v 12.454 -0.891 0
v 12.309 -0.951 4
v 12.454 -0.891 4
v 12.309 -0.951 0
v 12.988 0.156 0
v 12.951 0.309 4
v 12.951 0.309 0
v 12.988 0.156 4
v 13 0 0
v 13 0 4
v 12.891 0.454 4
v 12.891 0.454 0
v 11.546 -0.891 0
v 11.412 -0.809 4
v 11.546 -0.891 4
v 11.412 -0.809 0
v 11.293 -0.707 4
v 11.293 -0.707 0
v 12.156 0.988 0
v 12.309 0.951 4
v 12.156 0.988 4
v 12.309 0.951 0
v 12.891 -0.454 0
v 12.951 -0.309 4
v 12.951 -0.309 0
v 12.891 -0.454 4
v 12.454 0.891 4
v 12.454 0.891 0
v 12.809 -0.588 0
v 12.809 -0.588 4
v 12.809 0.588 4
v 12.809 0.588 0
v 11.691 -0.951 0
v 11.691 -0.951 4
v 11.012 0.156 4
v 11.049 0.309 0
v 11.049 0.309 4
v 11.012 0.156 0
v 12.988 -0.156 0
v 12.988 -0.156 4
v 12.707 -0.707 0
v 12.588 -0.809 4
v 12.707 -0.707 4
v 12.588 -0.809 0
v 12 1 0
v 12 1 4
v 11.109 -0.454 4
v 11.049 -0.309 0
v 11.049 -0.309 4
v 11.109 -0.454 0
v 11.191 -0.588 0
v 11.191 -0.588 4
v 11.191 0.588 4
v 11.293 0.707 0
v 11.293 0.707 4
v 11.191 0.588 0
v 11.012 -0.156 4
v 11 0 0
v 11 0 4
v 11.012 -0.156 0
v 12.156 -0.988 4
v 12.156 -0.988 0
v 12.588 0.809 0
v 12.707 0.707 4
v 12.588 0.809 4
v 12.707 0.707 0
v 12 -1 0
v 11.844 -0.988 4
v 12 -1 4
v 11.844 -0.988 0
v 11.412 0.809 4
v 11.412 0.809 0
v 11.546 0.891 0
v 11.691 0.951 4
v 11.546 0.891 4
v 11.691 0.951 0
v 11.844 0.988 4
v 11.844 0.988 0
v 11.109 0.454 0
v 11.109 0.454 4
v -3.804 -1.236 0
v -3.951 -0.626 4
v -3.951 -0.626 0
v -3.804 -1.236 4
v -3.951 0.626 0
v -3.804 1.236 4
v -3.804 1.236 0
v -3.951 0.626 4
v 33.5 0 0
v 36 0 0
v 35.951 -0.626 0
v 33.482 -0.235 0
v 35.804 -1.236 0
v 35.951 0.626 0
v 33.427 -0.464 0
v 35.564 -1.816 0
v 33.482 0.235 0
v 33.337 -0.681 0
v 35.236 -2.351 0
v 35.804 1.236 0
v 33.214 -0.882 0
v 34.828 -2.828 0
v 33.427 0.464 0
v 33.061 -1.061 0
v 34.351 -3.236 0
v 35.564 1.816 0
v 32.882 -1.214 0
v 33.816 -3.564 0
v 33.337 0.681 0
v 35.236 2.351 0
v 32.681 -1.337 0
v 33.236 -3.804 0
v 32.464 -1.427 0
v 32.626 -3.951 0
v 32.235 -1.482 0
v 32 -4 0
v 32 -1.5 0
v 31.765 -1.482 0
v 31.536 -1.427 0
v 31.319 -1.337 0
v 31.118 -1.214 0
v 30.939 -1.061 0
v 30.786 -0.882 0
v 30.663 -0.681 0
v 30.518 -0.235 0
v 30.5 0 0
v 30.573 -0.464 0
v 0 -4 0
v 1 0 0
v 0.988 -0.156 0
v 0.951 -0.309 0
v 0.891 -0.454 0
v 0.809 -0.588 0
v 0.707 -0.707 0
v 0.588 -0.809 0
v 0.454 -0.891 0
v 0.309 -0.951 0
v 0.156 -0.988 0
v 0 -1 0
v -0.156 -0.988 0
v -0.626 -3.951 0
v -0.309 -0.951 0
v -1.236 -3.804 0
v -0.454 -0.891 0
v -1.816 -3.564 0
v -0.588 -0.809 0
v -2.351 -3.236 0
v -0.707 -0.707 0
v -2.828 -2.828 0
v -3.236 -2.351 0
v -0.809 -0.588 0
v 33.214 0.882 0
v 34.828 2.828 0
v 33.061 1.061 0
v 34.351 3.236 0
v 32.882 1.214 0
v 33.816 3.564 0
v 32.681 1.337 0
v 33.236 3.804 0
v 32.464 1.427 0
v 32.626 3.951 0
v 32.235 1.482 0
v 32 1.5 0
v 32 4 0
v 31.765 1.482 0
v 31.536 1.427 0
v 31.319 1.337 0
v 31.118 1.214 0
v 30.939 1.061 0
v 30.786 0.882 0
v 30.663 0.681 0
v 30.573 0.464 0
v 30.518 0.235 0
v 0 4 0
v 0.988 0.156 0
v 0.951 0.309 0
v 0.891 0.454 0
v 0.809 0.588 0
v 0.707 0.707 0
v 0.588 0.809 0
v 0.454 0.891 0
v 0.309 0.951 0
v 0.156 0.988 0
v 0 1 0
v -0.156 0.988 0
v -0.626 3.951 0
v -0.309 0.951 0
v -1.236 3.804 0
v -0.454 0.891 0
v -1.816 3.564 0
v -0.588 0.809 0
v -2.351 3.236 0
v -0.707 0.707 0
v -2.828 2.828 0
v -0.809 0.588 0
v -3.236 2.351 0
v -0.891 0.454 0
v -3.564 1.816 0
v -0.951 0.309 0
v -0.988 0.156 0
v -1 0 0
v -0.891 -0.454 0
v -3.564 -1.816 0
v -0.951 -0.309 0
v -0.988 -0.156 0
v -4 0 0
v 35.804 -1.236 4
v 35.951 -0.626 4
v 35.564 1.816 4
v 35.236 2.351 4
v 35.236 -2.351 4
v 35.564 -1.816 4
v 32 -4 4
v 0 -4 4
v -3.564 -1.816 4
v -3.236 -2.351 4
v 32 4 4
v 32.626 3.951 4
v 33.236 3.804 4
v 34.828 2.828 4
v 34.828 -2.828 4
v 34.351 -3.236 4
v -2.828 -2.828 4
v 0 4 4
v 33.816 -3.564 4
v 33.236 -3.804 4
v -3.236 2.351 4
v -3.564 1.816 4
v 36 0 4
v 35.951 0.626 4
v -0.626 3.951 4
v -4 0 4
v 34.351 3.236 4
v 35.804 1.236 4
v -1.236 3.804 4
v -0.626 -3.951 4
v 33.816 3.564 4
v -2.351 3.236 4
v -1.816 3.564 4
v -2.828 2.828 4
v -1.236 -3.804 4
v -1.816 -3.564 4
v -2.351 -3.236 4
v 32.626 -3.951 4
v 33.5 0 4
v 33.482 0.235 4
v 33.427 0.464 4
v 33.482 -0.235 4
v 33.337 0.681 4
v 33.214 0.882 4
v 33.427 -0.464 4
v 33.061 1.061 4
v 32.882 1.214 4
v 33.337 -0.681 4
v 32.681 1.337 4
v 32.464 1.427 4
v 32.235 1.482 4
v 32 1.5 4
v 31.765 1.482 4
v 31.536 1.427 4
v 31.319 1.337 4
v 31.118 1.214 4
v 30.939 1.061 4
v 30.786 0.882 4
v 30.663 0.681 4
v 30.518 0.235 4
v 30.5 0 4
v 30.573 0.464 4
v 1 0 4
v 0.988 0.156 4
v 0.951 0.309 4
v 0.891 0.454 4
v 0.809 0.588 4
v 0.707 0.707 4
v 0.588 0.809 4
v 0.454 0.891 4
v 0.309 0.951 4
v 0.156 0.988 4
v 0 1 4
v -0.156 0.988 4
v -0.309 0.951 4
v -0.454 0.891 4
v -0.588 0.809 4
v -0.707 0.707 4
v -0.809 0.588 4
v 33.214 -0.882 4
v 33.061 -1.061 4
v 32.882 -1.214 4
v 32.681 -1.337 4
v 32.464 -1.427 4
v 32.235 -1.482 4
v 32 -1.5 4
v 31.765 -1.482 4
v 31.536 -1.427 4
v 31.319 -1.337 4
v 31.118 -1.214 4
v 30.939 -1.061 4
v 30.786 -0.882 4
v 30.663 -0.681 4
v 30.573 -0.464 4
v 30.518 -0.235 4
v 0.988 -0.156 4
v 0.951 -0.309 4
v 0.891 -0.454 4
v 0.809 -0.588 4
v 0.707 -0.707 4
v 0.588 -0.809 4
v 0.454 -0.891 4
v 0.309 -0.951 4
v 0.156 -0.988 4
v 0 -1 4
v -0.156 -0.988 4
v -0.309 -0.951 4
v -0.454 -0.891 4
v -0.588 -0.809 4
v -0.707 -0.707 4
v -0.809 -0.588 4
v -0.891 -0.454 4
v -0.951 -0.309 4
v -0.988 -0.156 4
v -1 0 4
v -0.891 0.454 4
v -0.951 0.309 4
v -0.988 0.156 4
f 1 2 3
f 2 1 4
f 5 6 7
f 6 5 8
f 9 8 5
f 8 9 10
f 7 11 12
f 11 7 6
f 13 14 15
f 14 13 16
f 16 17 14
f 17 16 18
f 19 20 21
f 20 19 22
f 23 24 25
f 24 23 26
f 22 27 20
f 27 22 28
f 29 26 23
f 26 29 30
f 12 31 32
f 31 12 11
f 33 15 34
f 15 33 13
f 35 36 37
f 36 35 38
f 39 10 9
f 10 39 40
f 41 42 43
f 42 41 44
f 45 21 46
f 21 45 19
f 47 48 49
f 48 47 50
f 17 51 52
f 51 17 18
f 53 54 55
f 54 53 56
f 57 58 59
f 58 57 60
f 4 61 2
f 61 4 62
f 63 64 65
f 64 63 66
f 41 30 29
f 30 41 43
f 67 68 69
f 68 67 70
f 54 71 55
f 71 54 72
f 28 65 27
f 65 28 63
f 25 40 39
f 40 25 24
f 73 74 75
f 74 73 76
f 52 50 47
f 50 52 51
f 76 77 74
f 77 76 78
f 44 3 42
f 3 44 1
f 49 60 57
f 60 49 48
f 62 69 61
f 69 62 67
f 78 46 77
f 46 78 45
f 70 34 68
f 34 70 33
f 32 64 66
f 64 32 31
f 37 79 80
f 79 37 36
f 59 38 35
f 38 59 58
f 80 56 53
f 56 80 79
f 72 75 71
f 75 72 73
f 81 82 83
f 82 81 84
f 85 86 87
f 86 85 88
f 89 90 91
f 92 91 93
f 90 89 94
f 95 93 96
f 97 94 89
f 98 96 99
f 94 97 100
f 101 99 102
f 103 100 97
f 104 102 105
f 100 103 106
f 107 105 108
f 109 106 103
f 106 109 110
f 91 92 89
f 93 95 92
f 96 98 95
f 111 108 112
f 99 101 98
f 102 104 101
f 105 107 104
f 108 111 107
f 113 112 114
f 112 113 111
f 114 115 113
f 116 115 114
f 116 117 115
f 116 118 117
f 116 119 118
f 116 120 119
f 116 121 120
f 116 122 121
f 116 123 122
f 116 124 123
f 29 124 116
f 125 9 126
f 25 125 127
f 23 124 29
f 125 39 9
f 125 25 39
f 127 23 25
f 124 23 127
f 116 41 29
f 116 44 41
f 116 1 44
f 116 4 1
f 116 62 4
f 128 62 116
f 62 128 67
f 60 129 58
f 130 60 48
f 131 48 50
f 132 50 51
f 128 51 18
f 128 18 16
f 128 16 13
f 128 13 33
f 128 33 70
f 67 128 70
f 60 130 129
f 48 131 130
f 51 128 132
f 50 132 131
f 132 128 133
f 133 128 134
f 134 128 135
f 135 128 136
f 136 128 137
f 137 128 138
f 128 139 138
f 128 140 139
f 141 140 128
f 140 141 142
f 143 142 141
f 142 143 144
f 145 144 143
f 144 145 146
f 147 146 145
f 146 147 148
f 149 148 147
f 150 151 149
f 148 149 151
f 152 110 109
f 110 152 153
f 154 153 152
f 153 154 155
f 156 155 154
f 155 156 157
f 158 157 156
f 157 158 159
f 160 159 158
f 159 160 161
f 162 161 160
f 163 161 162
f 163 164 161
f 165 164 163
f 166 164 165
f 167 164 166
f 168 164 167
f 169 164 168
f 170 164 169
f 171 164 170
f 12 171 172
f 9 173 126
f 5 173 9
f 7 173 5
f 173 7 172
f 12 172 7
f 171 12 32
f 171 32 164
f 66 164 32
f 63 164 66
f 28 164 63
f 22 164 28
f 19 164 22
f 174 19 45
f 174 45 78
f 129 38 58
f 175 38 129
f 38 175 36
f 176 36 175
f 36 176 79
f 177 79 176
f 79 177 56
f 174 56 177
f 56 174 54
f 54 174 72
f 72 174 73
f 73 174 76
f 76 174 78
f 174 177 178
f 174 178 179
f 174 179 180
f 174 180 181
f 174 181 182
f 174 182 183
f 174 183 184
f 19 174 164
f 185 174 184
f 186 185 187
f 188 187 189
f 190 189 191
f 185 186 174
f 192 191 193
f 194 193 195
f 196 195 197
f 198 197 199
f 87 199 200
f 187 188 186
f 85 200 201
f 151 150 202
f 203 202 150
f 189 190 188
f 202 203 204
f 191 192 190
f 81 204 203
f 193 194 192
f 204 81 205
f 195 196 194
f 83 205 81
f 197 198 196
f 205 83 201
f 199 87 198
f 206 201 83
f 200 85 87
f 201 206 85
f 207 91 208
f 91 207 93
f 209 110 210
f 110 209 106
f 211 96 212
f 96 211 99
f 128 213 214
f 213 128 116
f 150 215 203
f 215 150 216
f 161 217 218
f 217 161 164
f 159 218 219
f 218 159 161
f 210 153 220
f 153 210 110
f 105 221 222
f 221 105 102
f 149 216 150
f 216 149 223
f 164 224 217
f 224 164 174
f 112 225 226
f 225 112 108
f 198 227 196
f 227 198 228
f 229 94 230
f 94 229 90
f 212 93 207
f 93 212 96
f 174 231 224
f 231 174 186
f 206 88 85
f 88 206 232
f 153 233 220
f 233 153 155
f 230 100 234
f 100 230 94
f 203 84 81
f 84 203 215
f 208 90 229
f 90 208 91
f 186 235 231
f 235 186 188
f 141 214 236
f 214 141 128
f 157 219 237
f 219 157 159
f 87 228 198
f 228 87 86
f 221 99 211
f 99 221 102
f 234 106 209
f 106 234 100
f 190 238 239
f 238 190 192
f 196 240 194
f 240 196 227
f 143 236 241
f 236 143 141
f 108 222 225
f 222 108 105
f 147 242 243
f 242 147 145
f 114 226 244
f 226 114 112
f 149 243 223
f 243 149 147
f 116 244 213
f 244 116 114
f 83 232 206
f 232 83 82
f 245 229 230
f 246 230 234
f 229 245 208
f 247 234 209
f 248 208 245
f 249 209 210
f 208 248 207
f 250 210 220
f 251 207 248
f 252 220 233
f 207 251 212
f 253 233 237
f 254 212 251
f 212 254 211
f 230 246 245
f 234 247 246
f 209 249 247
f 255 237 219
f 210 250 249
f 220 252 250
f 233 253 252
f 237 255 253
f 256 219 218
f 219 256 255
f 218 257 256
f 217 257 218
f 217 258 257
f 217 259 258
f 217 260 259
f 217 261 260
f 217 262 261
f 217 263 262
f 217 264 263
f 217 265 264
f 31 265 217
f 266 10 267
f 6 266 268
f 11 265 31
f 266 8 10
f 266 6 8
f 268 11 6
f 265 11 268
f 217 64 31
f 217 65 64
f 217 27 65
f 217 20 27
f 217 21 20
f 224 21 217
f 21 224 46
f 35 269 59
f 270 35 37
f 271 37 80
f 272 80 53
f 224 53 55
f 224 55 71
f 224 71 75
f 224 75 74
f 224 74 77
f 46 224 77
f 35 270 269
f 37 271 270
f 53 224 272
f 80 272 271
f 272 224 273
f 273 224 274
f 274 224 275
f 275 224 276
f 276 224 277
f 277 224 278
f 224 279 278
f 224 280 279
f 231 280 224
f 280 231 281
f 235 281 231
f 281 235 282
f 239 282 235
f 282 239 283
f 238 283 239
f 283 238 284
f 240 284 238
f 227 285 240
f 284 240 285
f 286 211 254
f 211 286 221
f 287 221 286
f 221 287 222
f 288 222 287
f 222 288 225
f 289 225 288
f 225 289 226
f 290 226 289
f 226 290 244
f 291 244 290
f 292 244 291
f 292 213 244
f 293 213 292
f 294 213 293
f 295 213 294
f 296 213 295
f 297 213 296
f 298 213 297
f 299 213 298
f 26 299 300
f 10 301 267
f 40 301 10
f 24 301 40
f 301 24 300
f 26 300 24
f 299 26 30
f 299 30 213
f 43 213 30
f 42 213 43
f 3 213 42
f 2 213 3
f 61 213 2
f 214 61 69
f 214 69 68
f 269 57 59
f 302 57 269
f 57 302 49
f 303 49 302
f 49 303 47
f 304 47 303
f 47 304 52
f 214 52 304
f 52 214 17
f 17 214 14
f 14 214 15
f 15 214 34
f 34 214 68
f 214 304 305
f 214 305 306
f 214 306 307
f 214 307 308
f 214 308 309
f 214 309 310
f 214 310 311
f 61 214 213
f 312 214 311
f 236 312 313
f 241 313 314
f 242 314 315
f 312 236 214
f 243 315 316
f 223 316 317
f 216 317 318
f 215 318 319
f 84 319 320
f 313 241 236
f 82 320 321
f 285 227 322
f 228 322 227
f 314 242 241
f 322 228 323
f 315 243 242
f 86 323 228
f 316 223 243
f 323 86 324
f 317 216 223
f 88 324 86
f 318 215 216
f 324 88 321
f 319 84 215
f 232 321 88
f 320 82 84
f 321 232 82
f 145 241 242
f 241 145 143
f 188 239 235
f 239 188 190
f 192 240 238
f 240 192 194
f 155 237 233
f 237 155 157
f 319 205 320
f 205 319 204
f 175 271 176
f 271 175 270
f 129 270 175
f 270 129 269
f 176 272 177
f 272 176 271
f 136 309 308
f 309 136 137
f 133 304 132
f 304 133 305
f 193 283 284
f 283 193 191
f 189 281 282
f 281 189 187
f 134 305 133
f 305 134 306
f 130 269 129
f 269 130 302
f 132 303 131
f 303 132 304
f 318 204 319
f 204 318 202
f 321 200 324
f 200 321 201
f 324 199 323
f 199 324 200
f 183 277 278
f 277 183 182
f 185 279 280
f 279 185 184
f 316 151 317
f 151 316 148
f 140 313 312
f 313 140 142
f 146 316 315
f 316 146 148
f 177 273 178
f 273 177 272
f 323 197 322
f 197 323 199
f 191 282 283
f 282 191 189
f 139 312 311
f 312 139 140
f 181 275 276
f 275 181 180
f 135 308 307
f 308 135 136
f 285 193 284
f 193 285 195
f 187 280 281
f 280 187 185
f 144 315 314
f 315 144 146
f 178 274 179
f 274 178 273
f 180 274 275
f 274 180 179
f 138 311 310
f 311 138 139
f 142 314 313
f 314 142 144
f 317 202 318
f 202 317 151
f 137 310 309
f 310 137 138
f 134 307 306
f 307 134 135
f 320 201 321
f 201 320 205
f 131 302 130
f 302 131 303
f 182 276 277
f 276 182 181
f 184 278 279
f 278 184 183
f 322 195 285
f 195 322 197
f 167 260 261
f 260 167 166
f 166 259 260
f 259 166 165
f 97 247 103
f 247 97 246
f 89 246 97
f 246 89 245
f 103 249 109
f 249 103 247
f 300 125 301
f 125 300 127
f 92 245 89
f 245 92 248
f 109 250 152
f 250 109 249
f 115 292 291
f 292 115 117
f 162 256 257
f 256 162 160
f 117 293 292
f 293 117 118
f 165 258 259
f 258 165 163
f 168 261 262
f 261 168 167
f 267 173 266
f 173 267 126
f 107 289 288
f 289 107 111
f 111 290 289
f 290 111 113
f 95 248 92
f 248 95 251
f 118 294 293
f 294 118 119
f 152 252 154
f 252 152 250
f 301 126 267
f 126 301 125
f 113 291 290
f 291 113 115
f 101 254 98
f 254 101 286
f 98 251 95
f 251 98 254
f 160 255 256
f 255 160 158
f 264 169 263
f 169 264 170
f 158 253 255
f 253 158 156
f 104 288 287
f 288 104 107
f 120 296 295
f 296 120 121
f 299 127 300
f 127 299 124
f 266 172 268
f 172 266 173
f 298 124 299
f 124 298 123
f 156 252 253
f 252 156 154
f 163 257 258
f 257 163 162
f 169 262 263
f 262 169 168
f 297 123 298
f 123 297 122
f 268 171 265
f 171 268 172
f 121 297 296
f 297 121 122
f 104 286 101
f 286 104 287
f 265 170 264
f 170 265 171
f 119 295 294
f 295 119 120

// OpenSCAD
// jaw_linkage_arm.scad
//
// A rigid extension arm connecting the jaw servo's horn to the skull's
// jaw hinge pin, so the servo (mounted inside the upper skull) can pull
// the jaw open/closed as it rotates.
//
// PRINT SETTINGS: PLA or PETG, 100% infill (this part takes repeated
// mechanical stress — don't skimp on infill here), no supports needed.

arm_length   = 32;   // horn-pivot to jaw-pivot distance — measure your skull
arm_width    = 8;
arm_thick    = 4;

horn_hole_d  = 2.0;   // standard servo horn screw-hole diameter
jaw_pin_d    = 3.0;   // diameter of the pin/pivot you'll use at the jaw end

horn_circle_d = 24;   // MG996R horn diameter, for the mounting pattern
$fn = 40;

module arm() {
    difference() {
        union() {
            // main arm body, rounded ends
            hull() {
                translate([0, 0, 0]) cylinder(h = arm_thick, d = arm_width);
                translate([arm_length, 0, 0]) cylinder(h = arm_thick, d = arm_width);
            }
        }
        // horn-side mounting holes (screw straight into a servo horn arm,
        // or drill out to match your specific horn's hole pattern)
        translate([0, 0, -1]) cylinder(h = arm_thick + 2, d = horn_hole_d);
        for (a = [0:90:270])
            rotate([0, 0, a])
                translate([horn_circle_d/2, 0, -1])
                    cylinder(h = arm_thick + 2, d = horn_hole_d);
        // jaw-pivot hole at the far end
        translate([arm_length, 0, -1]) cylinder(h = arm_thick + 2, d = jaw_pin_d);
    }
}

arm();

// Reminder: rubber-dampen the jaw pivot end (a short piece of silicone
// tubing over the pin) so the jaw doesn't clack loudly against the skull
// on every closure — the original build guide's "add rubber dampers" step
// still applies here, just at this specific joint.
